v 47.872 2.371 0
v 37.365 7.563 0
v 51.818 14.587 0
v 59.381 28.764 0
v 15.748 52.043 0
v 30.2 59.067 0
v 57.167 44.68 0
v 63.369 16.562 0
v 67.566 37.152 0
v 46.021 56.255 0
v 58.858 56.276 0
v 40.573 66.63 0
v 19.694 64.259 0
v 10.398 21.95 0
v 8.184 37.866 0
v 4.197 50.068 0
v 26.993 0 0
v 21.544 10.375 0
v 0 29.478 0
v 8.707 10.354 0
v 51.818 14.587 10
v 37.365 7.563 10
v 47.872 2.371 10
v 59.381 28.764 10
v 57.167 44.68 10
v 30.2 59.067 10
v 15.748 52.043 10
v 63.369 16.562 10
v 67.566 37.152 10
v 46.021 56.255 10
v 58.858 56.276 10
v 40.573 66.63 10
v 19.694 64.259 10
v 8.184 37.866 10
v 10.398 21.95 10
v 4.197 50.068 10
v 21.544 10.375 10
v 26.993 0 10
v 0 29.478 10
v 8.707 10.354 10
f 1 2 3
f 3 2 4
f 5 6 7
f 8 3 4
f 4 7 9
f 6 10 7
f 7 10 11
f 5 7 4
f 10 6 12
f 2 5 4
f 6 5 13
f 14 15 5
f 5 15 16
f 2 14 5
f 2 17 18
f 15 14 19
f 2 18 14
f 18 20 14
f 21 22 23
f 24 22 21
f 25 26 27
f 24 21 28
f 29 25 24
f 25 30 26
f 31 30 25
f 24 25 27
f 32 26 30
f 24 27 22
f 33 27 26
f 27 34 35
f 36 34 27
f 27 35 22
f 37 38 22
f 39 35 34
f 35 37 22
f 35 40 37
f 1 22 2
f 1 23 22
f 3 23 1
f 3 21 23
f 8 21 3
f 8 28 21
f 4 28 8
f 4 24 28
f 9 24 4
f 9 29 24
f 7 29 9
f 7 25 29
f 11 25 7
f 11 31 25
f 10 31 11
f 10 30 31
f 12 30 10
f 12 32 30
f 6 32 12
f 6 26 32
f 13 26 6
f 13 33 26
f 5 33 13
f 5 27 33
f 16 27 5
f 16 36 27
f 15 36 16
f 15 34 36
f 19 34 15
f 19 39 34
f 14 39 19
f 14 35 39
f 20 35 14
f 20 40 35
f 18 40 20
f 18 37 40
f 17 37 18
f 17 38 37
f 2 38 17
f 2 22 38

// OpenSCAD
$fn = 32;

// ----------------------------------------------------------------------
// Chain sprocket: 10 teeth, 26 mm root radius
// ----------------------------------------------------------------------

// --- parameters (mm) ---
profile_height = 10;      // extrusion height
profile_points = 20;      // points of the closed outline

profile = [[59.381, 28.764], [67.566, 37.152], [57.167, 44.68], [58.858, 56.276], [46.021, 56.255], [40.573, 66.63], [30.2, 59.067], [19.694, 64.259], [15.748, 52.043], [4.197, 50.068], [8.184, 37.866], [0, 29.478], [10.398, 21.95], [8.707, 10.354], [21.544, 10.375], [26.993, 0], [37.365, 7.563], [47.872, 2.371], [51.818, 14.587], [63.369, 16.562]];  // single closed polygon, 20 points, counter clockwise

// --- the one profile operation ---
linear_extrude(height = profile_height) polygon(points = profile);
